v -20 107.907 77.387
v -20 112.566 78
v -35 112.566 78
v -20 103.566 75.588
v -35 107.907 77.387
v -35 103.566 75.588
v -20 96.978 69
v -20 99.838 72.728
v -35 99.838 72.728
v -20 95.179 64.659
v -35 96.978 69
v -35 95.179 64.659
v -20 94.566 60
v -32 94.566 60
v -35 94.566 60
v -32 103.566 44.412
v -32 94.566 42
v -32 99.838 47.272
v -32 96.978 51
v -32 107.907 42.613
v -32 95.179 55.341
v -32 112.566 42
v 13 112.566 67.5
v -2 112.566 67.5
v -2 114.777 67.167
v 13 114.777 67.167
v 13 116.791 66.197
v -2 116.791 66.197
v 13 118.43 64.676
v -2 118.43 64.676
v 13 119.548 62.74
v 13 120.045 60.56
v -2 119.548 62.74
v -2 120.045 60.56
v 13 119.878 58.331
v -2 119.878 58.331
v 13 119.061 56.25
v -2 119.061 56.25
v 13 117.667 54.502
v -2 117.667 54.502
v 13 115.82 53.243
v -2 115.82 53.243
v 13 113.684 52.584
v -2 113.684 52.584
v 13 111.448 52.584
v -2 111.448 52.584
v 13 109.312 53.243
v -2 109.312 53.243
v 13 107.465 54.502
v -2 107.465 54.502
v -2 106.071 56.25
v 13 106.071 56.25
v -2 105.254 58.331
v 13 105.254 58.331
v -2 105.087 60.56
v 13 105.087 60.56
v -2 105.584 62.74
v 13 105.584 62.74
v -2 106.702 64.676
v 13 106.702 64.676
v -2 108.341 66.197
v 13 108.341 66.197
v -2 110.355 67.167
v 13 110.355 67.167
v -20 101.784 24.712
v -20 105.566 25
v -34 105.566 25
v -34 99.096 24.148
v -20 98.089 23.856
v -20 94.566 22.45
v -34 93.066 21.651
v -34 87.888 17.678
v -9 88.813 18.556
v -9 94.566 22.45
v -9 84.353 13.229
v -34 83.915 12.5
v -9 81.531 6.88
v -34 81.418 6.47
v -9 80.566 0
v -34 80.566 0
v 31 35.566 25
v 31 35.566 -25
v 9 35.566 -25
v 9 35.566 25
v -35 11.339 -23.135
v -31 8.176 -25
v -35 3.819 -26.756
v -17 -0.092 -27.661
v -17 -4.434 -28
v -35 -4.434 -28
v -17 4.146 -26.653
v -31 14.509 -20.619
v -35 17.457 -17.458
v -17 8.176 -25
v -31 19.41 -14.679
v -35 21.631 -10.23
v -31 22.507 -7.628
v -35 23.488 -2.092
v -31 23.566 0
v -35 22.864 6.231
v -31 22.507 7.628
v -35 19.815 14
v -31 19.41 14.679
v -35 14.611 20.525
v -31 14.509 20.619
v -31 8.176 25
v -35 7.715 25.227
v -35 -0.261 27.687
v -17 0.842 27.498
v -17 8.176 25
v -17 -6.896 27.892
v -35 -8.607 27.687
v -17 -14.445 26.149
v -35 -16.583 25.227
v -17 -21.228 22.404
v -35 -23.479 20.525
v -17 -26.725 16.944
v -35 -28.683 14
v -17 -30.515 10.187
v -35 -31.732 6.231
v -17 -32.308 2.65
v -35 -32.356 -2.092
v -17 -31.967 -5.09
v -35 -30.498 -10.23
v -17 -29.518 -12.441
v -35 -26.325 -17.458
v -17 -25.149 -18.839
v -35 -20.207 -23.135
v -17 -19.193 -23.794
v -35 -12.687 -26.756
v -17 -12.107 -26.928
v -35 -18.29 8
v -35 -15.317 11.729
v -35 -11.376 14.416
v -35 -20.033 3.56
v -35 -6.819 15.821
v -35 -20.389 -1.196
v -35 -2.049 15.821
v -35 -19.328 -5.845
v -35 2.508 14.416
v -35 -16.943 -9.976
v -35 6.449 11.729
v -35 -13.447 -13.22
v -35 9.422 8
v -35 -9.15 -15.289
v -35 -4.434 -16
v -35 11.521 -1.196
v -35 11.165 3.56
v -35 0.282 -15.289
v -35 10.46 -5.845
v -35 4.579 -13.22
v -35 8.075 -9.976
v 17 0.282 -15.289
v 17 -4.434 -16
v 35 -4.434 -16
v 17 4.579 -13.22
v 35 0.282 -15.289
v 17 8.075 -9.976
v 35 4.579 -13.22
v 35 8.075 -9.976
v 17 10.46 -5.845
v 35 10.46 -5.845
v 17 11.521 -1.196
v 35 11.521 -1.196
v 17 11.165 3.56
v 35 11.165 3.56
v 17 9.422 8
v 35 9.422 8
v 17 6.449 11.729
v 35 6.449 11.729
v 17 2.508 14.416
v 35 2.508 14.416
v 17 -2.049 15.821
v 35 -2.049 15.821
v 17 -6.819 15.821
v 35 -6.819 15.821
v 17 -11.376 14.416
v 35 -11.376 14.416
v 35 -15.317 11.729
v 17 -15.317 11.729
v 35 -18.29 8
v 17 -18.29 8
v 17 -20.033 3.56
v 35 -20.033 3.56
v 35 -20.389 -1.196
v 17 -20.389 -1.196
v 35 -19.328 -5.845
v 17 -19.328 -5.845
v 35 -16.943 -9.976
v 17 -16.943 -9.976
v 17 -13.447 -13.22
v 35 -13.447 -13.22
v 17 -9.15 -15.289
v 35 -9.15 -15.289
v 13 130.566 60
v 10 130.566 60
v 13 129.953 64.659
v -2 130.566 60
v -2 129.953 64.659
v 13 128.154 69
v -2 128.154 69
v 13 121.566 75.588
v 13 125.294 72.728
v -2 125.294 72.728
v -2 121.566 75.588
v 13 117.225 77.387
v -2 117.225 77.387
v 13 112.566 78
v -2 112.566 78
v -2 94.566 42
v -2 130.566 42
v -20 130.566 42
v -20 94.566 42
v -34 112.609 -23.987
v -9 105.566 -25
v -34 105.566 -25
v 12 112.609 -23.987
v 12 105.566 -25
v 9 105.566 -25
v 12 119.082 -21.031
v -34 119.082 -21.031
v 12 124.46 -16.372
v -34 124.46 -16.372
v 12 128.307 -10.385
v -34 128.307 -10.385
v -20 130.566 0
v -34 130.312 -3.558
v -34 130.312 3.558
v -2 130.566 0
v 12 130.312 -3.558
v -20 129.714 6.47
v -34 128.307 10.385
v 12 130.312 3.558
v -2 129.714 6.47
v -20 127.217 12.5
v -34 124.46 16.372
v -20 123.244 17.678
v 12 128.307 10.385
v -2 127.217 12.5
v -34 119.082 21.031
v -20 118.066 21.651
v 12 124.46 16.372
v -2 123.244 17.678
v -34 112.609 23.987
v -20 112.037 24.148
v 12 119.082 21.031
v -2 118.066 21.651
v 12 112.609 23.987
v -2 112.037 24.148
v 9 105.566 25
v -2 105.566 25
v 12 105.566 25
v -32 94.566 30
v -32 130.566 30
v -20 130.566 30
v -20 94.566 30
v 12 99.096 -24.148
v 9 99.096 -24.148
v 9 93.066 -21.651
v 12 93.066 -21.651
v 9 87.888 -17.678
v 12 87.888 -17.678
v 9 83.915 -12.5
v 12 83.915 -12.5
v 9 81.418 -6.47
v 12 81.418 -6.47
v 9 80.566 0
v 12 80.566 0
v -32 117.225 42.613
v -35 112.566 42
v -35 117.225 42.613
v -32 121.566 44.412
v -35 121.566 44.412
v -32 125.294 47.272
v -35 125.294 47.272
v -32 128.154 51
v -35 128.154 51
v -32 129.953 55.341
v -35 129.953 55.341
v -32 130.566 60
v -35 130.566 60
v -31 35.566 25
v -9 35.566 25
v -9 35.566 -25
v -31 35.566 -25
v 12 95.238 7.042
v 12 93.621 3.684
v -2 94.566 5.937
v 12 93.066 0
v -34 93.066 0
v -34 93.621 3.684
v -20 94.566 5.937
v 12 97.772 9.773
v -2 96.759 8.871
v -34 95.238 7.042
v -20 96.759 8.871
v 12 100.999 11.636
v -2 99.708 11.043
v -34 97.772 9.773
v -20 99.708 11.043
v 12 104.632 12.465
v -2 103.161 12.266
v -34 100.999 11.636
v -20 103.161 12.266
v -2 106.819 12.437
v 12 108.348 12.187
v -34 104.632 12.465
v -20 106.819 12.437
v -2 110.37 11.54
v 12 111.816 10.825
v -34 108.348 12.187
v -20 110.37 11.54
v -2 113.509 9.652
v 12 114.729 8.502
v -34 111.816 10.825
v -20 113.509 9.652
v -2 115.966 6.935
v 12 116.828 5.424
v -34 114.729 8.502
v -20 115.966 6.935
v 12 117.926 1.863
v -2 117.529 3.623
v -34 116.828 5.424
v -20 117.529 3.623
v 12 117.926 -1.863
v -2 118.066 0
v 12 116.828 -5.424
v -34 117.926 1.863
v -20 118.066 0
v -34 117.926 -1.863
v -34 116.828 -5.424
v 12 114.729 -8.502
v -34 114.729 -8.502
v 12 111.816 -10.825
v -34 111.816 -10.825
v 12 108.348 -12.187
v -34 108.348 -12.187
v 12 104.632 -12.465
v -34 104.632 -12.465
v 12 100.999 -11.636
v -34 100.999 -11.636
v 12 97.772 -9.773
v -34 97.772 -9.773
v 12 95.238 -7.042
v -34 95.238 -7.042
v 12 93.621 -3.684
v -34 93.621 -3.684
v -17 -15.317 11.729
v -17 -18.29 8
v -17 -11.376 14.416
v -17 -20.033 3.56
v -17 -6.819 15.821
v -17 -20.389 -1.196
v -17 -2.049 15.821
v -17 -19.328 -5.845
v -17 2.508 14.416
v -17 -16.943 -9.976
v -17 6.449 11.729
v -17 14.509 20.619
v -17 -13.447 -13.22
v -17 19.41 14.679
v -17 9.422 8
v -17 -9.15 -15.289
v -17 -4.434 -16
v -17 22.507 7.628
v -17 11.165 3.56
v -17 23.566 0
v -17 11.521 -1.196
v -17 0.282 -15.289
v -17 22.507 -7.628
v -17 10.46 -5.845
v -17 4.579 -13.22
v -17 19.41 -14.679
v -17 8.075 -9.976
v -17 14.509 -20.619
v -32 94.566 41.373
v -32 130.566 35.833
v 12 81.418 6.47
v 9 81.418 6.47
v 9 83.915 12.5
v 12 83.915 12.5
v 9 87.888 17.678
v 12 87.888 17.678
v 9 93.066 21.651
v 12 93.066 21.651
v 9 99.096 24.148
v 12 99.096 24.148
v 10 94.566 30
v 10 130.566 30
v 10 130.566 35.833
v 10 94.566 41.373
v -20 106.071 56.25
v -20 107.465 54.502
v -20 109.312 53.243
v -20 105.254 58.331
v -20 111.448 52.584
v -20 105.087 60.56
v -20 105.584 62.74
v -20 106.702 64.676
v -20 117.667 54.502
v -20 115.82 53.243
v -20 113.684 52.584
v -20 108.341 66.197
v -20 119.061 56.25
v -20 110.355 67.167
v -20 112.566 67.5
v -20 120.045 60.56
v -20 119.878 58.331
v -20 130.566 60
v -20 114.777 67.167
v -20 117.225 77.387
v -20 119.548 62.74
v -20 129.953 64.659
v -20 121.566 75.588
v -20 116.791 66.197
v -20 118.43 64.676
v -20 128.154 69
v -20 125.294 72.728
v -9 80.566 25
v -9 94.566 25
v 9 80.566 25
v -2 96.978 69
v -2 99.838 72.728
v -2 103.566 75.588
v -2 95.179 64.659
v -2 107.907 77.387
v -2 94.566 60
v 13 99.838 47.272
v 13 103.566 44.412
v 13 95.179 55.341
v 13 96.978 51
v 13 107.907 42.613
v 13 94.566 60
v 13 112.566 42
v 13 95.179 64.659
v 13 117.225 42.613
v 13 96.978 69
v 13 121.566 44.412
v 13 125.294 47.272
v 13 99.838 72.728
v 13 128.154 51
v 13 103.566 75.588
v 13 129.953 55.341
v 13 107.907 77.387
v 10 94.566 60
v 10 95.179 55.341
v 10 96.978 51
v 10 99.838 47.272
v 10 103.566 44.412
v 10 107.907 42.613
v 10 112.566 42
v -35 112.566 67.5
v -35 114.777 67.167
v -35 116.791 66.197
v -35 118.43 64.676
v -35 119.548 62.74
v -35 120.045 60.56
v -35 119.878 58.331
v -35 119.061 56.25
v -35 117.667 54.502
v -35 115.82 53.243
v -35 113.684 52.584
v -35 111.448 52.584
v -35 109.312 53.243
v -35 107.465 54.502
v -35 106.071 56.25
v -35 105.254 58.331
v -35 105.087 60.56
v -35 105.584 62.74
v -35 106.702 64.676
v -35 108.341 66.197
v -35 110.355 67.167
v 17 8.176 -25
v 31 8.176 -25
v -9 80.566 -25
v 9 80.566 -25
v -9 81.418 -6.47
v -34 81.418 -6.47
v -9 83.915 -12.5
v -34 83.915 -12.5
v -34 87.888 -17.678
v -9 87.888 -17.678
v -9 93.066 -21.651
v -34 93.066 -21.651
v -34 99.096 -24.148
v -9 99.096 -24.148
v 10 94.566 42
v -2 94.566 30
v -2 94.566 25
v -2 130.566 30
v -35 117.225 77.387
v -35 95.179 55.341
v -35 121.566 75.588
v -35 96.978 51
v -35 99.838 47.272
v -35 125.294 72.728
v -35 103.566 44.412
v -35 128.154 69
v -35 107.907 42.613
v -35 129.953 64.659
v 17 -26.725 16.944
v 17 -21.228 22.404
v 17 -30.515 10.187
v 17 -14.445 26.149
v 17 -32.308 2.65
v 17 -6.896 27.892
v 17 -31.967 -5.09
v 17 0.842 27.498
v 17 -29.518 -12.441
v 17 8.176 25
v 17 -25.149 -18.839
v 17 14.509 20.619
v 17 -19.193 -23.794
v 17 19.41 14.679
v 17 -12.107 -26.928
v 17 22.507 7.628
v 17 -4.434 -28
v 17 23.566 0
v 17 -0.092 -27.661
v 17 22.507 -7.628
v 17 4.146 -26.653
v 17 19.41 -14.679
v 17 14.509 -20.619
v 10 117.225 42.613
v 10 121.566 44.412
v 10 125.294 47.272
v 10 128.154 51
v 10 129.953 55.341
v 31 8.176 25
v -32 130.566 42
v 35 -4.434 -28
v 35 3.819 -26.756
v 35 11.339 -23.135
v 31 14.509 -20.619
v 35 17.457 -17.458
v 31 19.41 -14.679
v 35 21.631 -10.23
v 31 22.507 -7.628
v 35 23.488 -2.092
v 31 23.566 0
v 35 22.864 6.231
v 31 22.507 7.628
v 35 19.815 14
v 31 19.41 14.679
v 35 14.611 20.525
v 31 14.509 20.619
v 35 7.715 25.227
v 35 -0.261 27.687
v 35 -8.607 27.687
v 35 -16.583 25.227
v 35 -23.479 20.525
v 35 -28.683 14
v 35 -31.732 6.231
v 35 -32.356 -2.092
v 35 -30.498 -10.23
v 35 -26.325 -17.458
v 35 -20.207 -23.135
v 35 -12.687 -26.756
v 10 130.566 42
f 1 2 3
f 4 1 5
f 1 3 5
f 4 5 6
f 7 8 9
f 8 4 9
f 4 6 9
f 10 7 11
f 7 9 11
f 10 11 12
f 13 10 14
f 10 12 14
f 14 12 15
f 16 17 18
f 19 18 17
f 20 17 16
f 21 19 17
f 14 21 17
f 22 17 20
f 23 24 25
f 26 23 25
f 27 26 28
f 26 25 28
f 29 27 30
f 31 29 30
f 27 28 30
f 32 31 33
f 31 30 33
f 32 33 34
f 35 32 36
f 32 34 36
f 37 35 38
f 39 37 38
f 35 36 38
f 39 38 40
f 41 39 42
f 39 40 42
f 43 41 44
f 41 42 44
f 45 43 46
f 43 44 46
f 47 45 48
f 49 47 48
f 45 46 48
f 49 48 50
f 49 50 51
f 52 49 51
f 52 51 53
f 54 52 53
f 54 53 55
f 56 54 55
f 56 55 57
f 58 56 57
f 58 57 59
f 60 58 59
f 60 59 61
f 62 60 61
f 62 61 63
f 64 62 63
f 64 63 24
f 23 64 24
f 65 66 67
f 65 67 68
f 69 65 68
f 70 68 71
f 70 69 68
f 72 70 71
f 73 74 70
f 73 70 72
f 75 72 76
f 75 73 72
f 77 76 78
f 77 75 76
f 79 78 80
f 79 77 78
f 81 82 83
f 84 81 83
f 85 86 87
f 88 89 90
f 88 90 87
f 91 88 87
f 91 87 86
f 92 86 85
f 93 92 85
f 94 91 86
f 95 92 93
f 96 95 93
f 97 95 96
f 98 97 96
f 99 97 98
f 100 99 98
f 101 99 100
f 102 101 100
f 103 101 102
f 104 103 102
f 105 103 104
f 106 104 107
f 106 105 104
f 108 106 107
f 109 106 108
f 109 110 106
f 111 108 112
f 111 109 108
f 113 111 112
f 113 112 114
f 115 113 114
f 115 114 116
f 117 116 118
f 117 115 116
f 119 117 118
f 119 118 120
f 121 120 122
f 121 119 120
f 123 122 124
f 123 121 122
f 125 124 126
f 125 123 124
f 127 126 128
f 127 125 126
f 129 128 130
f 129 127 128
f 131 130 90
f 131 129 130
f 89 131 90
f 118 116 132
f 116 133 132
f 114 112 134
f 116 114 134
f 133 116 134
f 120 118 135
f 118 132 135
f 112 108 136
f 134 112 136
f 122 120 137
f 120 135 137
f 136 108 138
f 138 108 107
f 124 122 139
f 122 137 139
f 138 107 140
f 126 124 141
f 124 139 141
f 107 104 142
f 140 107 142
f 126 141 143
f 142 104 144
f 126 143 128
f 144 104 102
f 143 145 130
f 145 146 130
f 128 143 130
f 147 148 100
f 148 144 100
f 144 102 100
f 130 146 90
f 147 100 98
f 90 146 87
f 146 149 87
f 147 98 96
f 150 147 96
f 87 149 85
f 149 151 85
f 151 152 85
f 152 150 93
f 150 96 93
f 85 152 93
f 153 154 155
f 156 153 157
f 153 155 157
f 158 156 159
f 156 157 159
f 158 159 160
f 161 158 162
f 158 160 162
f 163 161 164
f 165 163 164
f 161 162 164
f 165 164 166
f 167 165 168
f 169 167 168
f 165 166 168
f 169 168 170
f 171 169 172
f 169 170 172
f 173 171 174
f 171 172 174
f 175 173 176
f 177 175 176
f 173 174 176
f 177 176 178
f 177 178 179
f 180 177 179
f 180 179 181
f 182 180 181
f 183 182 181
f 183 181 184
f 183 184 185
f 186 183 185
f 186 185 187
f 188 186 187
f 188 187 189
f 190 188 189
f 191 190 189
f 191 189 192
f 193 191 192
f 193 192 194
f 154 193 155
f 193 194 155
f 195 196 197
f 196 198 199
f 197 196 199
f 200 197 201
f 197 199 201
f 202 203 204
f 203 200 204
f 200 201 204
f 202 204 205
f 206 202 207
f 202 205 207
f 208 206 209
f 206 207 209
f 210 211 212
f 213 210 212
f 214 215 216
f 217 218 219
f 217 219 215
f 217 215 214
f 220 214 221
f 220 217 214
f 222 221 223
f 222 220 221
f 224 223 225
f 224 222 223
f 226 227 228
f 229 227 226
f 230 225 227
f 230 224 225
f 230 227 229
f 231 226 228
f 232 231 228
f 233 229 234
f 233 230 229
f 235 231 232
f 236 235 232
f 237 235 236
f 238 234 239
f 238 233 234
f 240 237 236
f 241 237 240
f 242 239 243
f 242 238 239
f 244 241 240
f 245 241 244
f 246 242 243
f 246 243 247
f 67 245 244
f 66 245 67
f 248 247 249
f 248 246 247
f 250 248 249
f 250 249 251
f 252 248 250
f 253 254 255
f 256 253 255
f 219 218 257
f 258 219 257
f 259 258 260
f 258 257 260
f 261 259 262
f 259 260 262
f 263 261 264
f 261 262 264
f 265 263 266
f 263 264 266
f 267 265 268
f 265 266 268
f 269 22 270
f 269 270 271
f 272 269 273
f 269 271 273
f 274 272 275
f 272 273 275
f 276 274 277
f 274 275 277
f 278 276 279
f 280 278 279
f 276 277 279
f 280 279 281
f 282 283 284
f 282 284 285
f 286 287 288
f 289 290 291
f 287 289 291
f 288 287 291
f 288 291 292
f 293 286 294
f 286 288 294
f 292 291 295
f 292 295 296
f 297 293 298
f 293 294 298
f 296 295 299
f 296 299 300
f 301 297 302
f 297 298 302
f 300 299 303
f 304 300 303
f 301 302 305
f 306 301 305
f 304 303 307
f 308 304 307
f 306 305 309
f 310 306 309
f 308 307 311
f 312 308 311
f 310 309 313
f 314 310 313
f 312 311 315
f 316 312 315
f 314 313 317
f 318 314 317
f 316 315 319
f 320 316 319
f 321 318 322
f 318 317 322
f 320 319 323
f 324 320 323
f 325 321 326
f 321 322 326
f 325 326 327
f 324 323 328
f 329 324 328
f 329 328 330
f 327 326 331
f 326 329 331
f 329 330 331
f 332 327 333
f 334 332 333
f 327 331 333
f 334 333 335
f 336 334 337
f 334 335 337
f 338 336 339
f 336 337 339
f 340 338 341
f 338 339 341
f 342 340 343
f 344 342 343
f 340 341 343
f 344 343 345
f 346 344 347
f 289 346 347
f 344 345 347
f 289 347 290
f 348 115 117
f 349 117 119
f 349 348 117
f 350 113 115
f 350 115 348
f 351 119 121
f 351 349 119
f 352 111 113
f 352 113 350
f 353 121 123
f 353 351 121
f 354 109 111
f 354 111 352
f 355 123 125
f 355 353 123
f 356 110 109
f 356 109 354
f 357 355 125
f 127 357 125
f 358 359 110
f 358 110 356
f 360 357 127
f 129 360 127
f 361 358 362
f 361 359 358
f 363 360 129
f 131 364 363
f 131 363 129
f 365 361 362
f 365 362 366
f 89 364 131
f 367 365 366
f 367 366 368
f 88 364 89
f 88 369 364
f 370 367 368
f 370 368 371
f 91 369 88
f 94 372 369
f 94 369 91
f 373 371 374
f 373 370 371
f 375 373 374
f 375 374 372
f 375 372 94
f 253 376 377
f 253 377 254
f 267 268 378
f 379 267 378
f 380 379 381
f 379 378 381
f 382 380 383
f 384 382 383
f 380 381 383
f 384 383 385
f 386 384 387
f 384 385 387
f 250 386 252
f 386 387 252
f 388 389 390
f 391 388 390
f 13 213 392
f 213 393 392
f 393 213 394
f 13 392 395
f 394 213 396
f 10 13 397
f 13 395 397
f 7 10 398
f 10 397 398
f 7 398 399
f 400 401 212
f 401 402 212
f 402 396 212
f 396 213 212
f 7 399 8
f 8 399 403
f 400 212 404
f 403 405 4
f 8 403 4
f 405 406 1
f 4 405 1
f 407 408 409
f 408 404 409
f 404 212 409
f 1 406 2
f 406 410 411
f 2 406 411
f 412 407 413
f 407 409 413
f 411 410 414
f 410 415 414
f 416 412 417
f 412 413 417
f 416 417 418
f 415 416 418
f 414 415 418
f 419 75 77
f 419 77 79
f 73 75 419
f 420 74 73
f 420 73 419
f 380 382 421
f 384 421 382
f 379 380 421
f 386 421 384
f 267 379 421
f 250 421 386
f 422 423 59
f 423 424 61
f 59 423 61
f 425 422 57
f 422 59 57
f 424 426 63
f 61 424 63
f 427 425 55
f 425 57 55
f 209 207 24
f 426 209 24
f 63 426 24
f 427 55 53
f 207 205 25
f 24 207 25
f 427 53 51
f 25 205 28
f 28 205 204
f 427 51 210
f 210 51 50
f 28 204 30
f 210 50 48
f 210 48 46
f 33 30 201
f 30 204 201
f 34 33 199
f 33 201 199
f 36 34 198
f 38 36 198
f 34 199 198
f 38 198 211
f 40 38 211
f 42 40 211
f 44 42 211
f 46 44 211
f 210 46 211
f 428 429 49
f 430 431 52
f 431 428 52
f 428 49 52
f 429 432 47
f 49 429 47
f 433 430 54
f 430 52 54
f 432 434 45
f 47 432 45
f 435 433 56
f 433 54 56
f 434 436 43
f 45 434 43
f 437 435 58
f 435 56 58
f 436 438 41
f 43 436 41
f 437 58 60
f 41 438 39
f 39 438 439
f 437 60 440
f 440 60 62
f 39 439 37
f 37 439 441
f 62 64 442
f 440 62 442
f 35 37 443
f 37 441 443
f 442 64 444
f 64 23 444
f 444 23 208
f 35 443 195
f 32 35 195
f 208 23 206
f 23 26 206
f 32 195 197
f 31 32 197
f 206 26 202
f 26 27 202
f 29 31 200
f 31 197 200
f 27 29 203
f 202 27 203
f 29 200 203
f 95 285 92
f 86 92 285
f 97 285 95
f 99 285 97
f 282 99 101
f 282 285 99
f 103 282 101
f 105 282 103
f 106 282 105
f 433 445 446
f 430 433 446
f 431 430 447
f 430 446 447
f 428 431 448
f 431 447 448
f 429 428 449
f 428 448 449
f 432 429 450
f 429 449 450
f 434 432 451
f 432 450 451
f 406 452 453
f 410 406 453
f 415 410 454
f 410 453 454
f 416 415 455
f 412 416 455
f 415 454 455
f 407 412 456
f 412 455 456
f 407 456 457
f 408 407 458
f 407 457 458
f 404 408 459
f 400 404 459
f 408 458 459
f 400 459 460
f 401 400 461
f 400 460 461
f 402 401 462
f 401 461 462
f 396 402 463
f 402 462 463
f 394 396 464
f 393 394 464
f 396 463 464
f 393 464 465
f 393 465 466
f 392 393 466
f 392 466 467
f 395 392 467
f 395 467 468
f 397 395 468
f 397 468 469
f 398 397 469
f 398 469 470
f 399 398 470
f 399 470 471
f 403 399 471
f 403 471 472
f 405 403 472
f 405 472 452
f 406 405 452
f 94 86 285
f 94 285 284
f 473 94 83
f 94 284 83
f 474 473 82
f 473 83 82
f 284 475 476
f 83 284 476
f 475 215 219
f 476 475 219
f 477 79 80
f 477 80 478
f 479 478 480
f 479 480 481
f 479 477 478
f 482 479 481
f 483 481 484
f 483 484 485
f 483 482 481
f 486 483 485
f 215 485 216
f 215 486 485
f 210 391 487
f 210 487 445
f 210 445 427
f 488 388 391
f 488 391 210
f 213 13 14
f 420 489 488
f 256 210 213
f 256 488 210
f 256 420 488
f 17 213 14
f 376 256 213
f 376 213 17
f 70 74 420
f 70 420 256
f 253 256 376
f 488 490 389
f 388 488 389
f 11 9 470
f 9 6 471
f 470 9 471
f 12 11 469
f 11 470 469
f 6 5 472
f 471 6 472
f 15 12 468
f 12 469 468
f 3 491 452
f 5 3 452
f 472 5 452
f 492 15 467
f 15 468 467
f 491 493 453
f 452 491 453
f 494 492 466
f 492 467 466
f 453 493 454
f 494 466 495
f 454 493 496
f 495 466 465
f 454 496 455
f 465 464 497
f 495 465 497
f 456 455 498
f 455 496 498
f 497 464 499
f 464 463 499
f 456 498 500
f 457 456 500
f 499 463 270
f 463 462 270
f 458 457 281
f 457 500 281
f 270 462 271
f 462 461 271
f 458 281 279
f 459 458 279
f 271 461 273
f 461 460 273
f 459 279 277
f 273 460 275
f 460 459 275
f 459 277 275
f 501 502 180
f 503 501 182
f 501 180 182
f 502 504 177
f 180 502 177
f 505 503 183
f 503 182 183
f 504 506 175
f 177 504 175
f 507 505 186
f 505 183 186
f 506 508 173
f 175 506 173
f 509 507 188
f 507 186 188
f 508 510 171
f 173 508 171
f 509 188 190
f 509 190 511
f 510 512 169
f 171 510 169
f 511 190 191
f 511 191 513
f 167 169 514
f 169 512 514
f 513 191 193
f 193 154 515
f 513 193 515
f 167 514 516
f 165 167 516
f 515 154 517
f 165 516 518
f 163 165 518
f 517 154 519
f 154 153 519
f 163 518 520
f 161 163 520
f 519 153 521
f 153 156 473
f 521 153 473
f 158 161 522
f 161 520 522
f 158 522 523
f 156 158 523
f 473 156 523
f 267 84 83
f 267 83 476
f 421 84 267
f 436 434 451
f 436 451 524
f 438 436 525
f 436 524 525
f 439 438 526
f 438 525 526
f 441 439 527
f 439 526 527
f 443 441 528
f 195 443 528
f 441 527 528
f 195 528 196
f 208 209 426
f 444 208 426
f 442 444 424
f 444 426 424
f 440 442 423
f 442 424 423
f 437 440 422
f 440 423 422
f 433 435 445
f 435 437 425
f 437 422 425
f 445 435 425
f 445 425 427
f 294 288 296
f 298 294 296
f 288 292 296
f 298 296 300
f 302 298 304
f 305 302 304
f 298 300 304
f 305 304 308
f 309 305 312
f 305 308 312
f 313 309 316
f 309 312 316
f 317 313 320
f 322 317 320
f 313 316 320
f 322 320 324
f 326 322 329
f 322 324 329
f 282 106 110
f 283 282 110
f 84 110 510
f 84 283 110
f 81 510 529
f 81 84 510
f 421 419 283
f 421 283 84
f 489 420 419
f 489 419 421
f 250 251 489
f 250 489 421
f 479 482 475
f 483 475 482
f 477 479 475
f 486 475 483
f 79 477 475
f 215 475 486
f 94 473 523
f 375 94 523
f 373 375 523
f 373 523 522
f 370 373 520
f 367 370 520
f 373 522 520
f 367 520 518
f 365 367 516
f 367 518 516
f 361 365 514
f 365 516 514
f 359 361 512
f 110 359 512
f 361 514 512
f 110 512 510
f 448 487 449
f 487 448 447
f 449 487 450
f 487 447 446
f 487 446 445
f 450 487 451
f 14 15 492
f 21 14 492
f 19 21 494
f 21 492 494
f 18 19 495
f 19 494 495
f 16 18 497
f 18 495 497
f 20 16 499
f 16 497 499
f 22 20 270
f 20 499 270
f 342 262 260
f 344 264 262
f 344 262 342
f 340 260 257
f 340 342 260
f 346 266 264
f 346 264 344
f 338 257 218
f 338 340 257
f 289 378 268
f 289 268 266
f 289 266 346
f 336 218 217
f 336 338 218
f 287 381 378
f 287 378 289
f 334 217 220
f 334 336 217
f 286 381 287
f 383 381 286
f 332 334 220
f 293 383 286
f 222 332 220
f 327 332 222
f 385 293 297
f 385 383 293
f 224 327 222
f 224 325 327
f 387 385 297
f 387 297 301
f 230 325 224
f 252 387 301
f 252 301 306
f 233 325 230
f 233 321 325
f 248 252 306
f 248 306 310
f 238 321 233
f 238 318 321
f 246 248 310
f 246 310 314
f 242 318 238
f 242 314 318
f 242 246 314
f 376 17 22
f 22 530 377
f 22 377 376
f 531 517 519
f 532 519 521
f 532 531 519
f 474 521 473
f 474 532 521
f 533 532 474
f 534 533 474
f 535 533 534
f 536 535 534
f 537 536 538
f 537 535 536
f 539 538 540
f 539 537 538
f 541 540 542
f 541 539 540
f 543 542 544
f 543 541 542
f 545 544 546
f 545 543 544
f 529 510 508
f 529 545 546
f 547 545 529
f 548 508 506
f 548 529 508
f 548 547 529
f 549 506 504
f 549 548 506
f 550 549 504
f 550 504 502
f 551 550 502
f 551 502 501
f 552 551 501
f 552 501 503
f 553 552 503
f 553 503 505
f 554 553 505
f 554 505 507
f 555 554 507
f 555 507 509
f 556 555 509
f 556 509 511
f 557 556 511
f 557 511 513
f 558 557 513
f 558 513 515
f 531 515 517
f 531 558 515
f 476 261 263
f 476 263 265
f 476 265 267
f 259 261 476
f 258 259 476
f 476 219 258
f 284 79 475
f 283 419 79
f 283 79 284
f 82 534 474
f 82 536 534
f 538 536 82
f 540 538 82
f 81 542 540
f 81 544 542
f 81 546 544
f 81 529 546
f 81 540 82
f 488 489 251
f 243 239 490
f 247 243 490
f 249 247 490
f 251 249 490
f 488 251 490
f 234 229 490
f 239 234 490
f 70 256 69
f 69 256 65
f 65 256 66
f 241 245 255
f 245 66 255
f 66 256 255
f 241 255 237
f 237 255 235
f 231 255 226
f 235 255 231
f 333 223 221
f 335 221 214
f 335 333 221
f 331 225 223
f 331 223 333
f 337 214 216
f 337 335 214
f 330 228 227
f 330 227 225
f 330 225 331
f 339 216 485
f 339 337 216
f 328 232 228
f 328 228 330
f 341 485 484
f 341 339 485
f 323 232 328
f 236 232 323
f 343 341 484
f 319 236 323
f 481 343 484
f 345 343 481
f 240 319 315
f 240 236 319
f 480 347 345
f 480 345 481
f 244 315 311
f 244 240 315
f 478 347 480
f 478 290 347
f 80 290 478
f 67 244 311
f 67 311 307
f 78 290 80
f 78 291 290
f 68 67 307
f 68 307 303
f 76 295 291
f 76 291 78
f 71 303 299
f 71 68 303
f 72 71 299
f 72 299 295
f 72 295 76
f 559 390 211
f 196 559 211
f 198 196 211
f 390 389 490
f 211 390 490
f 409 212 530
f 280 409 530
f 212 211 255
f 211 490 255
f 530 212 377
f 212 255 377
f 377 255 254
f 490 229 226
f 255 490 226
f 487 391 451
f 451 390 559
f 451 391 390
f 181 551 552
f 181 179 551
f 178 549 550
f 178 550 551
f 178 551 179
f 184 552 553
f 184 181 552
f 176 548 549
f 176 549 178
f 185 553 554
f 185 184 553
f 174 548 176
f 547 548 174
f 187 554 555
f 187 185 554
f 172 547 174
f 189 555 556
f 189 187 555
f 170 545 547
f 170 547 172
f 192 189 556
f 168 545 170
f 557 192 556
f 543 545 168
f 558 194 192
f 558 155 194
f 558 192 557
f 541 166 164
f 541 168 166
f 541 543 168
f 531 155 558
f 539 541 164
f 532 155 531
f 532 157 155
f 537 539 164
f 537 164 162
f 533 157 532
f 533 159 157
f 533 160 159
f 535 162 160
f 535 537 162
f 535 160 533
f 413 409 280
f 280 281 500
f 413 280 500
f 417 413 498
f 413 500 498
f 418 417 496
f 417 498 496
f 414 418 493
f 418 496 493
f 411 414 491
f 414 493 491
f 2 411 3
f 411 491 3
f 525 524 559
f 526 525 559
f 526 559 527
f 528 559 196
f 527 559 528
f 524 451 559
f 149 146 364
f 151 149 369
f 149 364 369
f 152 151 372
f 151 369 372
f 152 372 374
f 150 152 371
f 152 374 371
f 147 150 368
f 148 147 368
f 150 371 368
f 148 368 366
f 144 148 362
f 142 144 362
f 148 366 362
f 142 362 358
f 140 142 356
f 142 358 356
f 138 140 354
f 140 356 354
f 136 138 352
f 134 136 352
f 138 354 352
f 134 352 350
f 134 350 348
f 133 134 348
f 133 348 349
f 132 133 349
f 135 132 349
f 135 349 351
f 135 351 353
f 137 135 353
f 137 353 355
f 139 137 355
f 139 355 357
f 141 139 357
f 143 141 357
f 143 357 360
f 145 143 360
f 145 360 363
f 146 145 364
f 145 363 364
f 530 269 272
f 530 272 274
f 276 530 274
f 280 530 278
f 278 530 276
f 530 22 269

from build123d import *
from build123d.topology import SkipClean

# Parameters (mm, degrees)
BOSS_EXTRUDE1_DEPTH = 25
CUT_EXTRUDE1_DEPTH  = 148.978005832
CUT_EXTRUDE9_DEPTH  = 3
CUT_EXTRUDE10_START = -25
CUT_EXTRUDE10_DEPTH = 173.978005832
SKETCH6_3_R         = 12.5
CUT_EXTRUDE11_DEPTH = 148.978005832
BOSS_EXTRUDE2_START = 4
SKETCH7_R           = 28
SKETCH7_R_2         = 16
BOSS_EXTRUDE2_DEPTH = 18
LPATTERN1_COUNT     = 2
LPATTERN1_PITCH     = 52
BOSS_EXTRUDE3_DEPTH = 36
SKETCH9_R           = 12.5
CUT_EXTRUDE12_DEPTH = 168.010449404
CUT_EXTRUDE13_DEPTH = 168.426073866
CUT_EXTRUDE14_DEPTH = 3
LPATTERN2_COUNT     = 2
LPATTERN2_PITCH     = 45
SKETCH12_R          = 7.5
CUT_EXTRUDE15_DEPTH = 168.426073866


with BuildPart() as part:
    # Sketch2 → Boss-Extrude1 (new, symmetric)
    with BuildSketch(Plane.XY):
        Polygon((-1, -32.433962264), (31, -32.433962264), (31, 35.566037736), (9, 35.566037736), (9, 80.566037736), (12, 80.566037736), (12, 130.566037736), (0, 130.566037736), (-34, 130.566037736), (-34, 80.566037736), (-9, 80.566037736), (-9, 35.566037736), (-31, 35.566037736), (-31, -32.433962264), align=None)
    extrude(amount=BOSS_EXTRUDE1_DEPTH, both=True)

    # Sketch3 → Cut-Extrude1 (cut, through all)
    with BuildSketch(Plane(origin=(31, 0, 0), x_dir=(0, 0, -1), z_dir=(1, 0, 0))):
        with BuildLine():
            Line((-28, -4.433962264), (-30.641953589, -47.1115747))
            Line((-30.641953589, -47.1115747), (44.761332348, -47.1115747))
            Line((44.761332348, -47.1115747), (28, -4.433962264))
            ThreePointArc((28, -4.433962264), (0, 23.566037736), (-28, -4.433962264))
        make_face()
        with BuildLine():
            Line((-25, 105.566037736), (-43.623428006, 147.748377779))
            Line((-43.623428006, 147.748377779), (44.761332348, 142.473077281))
            Line((44.761332348, 142.473077281), (25, 105.566037736))
            ThreePointArc((25, 105.566037736), (0, 130.566037736), (-25, 105.566037736))
        make_face()
    extrude(amount=-CUT_EXTRUDE1_DEPTH, mode=Mode.SUBTRACT)

    # Sketch5 → Cut-Extrude9 (cut)
    with SkipClean():  # the faces are left unmerged after this step: merging them gives an invalid solid
        with BuildSketch(Plane(origin=(12, 0, 0), x_dir=(0, 0, -1), z_dir=(1, 0, 0))):
            with BuildLine():
                ThreePointArc((25, 105.566037736), (17.677669479, 87.888368155), (-1.45e-07, 80.566037736))
                Line((-1.45e-07, 80.566037736), (25, 80.566037736))
                Line((25, 80.566037736), (25, 105.566037736))
            make_face()
            with BuildLine():
                ThreePointArc((-1.45e-07, 80.566037736), (-17.677669581, 87.888368257), (-25, 105.566037736))
                Line((-25, 105.566037736), (-25, 80.566037736))
                Line((-25, 80.566037736), (-1.45e-07, 80.566037736))
            make_face()
        extrude(amount=-CUT_EXTRUDE9_DEPTH, mode=Mode.SUBTRACT)

    # Sketch6 → Cut-Extrude10 (cut, through all)
    with SkipClean():  # the faces are left unmerged after this step: merging them gives an invalid solid
        with BuildSketch(Plane.ZY.offset(34).offset(CUT_EXTRUDE10_START)):
            with BuildLine():
                Line((25, 80.566037736), (25, 105.566037736))
                ThreePointArc((25, 105.566037736), (17.6776695, 87.888368176), (-8.4e-08, 80.566037736))
                Line((-8.4e-08, 80.566037736), (25, 80.566037736))
            make_face()
            with BuildLine():
                ThreePointArc((-8.4e-08, 80.566037736), (-17.677669559, 87.888368236), (-25, 105.566037736))
                Line((-25, 105.566037736), (-25, 80.566037736))
                Line((-25, 80.566037736), (-8.4e-08, 80.566037736))
            make_face()
        extrude(amount=CUT_EXTRUDE10_DEPTH, mode=Mode.SUBTRACT)

    # Sketch6<3> → Cut-Extrude11 (cut, through all)
    with SkipClean():  # the faces are left unmerged after this step: merging them gives an invalid solid
        with BuildSketch(Plane.ZY.offset(34)):
            with Locations(Location((0, 105.566037736, 0), (0, 0, 270))):
                Circle(SKETCH6_3_R)
        extrude(amount=-CUT_EXTRUDE11_DEPTH, mode=Mode.SUBTRACT)

    # Sketch7 → Boss-Extrude2 (add)
    with SkipClean():  # the faces are left unmerged after this step: merging them gives an invalid solid
        with BuildSketch(Plane(origin=(31, 0, 0), x_dir=(0, 0, -1), z_dir=(1, 0, 0)).offset(BOSS_EXTRUDE2_START)):
            with Locations((0, -4.433962264)):
                Circle(SKETCH7_R)
            with Locations((0, -4.433962264)):
                Circle(SKETCH7_R_2, mode=Mode.SUBTRACT)
        boss_extrude2 = extrude(amount=-BOSS_EXTRUDE2_DEPTH)

    # LPattern1: Boss-Extrude2 ×2
    with SkipClean():  # the faces are left unmerged after this step: merging them gives an invalid solid
        with Locations(*[(-i * LPATTERN1_PITCH, 0, 0) for i in range(1, LPATTERN1_COUNT)]):
            add(boss_extrude2)

    # Sketch8 → Boss-Extrude3 (add)
    with SkipClean():  # the faces are left unmerged after this step: merging them gives an invalid solid
        with BuildSketch(Plane(origin=(0, 130.566037736, 0), x_dir=(1, 0, 0), z_dir=(0, 1, 0))):
            Polygon((-20, 0), (-2, 0), (-2, -30), (10, -30), (10, -42), (13, -42), (13, -78), (-2, -78), (-2, -42), (-20, -42), (-20, -78), (-35, -78), (-35, -42), (-32, -42), (-32, -30), (-20, -30), align=None)
        extrude(amount=-BOSS_EXTRUDE3_DEPTH)

    # Sketch9 → Cut-Extrude12 (cut, through all)
    with SkipClean():  # the faces are left unmerged after this step: merging them gives an invalid solid
        with BuildSketch(Plane.ZY.offset(34)):
            with Locations(Location((0, 105.566037736, 0), (0, 0, 270))):
                Circle(SKETCH9_R)
        extrude(amount=-CUT_EXTRUDE12_DEPTH, mode=Mode.SUBTRACT)

    # Sketch10 → Cut-Extrude13 (cut, through all)
    with SkipClean():  # the faces are left unmerged after this step: merging them gives an invalid solid
        with BuildSketch(Plane.ZY.offset(35)):
            with BuildLine():
                Line((60, 94.566037736), (99.579352657, 93.222301479))
                Line((99.579352657, 93.222301479), (99.579352657, 133.580048743))
                Line((99.579352657, 133.580048743), (60, 130.566037736))
                ThreePointArc((60, 130.566037736), (78, 112.566037736), (60, 94.566037736))
            make_face()
        extrude(amount=-CUT_EXTRUDE13_DEPTH, mode=Mode.SUBTRACT)

    # Sketch11 → Cut-Extrude14 (cut)
    with SkipClean():  # the faces are left unmerged after this step: merging them gives an invalid solid
        with BuildSketch(Plane.ZY.offset(35)):
            with BuildLine():
                Line((60, 130.566037736), (34.988350442, 136.05842118))
                Line((34.988350442, 136.05842118), (42, 90.490327212))
                Line((42, 90.490327212), (60, 94.566037736))
                ThreePointArc((60, 94.566037736), (42, 112.566037736), (60, 130.566037736))
            make_face()
        cut_extrude14 = extrude(amount=-CUT_EXTRUDE14_DEPTH, mode=Mode.SUBTRACT)

    # LPattern2: Cut-Extrude14 ×2
    with SkipClean():  # the faces are left unmerged after this step: merging them gives an invalid solid
        with Locations(*[(i * LPATTERN2_PITCH, 0, 0) for i in range(1, LPATTERN2_COUNT)]):
            add(cut_extrude14, mode=Mode.SUBTRACT)

    # Sketch12 → Cut-Extrude15 (cut, through all)
    with SkipClean():  # the faces are left unmerged after this step: merging them gives an invalid solid
        with BuildSketch(Plane.ZY.offset(35)):
            with Locations((60, 112.566037736)):
                Circle(SKETCH12_R)
        extrude(amount=-CUT_EXTRUDE15_DEPTH, mode=Mode.SUBTRACT)


solid = part.part
